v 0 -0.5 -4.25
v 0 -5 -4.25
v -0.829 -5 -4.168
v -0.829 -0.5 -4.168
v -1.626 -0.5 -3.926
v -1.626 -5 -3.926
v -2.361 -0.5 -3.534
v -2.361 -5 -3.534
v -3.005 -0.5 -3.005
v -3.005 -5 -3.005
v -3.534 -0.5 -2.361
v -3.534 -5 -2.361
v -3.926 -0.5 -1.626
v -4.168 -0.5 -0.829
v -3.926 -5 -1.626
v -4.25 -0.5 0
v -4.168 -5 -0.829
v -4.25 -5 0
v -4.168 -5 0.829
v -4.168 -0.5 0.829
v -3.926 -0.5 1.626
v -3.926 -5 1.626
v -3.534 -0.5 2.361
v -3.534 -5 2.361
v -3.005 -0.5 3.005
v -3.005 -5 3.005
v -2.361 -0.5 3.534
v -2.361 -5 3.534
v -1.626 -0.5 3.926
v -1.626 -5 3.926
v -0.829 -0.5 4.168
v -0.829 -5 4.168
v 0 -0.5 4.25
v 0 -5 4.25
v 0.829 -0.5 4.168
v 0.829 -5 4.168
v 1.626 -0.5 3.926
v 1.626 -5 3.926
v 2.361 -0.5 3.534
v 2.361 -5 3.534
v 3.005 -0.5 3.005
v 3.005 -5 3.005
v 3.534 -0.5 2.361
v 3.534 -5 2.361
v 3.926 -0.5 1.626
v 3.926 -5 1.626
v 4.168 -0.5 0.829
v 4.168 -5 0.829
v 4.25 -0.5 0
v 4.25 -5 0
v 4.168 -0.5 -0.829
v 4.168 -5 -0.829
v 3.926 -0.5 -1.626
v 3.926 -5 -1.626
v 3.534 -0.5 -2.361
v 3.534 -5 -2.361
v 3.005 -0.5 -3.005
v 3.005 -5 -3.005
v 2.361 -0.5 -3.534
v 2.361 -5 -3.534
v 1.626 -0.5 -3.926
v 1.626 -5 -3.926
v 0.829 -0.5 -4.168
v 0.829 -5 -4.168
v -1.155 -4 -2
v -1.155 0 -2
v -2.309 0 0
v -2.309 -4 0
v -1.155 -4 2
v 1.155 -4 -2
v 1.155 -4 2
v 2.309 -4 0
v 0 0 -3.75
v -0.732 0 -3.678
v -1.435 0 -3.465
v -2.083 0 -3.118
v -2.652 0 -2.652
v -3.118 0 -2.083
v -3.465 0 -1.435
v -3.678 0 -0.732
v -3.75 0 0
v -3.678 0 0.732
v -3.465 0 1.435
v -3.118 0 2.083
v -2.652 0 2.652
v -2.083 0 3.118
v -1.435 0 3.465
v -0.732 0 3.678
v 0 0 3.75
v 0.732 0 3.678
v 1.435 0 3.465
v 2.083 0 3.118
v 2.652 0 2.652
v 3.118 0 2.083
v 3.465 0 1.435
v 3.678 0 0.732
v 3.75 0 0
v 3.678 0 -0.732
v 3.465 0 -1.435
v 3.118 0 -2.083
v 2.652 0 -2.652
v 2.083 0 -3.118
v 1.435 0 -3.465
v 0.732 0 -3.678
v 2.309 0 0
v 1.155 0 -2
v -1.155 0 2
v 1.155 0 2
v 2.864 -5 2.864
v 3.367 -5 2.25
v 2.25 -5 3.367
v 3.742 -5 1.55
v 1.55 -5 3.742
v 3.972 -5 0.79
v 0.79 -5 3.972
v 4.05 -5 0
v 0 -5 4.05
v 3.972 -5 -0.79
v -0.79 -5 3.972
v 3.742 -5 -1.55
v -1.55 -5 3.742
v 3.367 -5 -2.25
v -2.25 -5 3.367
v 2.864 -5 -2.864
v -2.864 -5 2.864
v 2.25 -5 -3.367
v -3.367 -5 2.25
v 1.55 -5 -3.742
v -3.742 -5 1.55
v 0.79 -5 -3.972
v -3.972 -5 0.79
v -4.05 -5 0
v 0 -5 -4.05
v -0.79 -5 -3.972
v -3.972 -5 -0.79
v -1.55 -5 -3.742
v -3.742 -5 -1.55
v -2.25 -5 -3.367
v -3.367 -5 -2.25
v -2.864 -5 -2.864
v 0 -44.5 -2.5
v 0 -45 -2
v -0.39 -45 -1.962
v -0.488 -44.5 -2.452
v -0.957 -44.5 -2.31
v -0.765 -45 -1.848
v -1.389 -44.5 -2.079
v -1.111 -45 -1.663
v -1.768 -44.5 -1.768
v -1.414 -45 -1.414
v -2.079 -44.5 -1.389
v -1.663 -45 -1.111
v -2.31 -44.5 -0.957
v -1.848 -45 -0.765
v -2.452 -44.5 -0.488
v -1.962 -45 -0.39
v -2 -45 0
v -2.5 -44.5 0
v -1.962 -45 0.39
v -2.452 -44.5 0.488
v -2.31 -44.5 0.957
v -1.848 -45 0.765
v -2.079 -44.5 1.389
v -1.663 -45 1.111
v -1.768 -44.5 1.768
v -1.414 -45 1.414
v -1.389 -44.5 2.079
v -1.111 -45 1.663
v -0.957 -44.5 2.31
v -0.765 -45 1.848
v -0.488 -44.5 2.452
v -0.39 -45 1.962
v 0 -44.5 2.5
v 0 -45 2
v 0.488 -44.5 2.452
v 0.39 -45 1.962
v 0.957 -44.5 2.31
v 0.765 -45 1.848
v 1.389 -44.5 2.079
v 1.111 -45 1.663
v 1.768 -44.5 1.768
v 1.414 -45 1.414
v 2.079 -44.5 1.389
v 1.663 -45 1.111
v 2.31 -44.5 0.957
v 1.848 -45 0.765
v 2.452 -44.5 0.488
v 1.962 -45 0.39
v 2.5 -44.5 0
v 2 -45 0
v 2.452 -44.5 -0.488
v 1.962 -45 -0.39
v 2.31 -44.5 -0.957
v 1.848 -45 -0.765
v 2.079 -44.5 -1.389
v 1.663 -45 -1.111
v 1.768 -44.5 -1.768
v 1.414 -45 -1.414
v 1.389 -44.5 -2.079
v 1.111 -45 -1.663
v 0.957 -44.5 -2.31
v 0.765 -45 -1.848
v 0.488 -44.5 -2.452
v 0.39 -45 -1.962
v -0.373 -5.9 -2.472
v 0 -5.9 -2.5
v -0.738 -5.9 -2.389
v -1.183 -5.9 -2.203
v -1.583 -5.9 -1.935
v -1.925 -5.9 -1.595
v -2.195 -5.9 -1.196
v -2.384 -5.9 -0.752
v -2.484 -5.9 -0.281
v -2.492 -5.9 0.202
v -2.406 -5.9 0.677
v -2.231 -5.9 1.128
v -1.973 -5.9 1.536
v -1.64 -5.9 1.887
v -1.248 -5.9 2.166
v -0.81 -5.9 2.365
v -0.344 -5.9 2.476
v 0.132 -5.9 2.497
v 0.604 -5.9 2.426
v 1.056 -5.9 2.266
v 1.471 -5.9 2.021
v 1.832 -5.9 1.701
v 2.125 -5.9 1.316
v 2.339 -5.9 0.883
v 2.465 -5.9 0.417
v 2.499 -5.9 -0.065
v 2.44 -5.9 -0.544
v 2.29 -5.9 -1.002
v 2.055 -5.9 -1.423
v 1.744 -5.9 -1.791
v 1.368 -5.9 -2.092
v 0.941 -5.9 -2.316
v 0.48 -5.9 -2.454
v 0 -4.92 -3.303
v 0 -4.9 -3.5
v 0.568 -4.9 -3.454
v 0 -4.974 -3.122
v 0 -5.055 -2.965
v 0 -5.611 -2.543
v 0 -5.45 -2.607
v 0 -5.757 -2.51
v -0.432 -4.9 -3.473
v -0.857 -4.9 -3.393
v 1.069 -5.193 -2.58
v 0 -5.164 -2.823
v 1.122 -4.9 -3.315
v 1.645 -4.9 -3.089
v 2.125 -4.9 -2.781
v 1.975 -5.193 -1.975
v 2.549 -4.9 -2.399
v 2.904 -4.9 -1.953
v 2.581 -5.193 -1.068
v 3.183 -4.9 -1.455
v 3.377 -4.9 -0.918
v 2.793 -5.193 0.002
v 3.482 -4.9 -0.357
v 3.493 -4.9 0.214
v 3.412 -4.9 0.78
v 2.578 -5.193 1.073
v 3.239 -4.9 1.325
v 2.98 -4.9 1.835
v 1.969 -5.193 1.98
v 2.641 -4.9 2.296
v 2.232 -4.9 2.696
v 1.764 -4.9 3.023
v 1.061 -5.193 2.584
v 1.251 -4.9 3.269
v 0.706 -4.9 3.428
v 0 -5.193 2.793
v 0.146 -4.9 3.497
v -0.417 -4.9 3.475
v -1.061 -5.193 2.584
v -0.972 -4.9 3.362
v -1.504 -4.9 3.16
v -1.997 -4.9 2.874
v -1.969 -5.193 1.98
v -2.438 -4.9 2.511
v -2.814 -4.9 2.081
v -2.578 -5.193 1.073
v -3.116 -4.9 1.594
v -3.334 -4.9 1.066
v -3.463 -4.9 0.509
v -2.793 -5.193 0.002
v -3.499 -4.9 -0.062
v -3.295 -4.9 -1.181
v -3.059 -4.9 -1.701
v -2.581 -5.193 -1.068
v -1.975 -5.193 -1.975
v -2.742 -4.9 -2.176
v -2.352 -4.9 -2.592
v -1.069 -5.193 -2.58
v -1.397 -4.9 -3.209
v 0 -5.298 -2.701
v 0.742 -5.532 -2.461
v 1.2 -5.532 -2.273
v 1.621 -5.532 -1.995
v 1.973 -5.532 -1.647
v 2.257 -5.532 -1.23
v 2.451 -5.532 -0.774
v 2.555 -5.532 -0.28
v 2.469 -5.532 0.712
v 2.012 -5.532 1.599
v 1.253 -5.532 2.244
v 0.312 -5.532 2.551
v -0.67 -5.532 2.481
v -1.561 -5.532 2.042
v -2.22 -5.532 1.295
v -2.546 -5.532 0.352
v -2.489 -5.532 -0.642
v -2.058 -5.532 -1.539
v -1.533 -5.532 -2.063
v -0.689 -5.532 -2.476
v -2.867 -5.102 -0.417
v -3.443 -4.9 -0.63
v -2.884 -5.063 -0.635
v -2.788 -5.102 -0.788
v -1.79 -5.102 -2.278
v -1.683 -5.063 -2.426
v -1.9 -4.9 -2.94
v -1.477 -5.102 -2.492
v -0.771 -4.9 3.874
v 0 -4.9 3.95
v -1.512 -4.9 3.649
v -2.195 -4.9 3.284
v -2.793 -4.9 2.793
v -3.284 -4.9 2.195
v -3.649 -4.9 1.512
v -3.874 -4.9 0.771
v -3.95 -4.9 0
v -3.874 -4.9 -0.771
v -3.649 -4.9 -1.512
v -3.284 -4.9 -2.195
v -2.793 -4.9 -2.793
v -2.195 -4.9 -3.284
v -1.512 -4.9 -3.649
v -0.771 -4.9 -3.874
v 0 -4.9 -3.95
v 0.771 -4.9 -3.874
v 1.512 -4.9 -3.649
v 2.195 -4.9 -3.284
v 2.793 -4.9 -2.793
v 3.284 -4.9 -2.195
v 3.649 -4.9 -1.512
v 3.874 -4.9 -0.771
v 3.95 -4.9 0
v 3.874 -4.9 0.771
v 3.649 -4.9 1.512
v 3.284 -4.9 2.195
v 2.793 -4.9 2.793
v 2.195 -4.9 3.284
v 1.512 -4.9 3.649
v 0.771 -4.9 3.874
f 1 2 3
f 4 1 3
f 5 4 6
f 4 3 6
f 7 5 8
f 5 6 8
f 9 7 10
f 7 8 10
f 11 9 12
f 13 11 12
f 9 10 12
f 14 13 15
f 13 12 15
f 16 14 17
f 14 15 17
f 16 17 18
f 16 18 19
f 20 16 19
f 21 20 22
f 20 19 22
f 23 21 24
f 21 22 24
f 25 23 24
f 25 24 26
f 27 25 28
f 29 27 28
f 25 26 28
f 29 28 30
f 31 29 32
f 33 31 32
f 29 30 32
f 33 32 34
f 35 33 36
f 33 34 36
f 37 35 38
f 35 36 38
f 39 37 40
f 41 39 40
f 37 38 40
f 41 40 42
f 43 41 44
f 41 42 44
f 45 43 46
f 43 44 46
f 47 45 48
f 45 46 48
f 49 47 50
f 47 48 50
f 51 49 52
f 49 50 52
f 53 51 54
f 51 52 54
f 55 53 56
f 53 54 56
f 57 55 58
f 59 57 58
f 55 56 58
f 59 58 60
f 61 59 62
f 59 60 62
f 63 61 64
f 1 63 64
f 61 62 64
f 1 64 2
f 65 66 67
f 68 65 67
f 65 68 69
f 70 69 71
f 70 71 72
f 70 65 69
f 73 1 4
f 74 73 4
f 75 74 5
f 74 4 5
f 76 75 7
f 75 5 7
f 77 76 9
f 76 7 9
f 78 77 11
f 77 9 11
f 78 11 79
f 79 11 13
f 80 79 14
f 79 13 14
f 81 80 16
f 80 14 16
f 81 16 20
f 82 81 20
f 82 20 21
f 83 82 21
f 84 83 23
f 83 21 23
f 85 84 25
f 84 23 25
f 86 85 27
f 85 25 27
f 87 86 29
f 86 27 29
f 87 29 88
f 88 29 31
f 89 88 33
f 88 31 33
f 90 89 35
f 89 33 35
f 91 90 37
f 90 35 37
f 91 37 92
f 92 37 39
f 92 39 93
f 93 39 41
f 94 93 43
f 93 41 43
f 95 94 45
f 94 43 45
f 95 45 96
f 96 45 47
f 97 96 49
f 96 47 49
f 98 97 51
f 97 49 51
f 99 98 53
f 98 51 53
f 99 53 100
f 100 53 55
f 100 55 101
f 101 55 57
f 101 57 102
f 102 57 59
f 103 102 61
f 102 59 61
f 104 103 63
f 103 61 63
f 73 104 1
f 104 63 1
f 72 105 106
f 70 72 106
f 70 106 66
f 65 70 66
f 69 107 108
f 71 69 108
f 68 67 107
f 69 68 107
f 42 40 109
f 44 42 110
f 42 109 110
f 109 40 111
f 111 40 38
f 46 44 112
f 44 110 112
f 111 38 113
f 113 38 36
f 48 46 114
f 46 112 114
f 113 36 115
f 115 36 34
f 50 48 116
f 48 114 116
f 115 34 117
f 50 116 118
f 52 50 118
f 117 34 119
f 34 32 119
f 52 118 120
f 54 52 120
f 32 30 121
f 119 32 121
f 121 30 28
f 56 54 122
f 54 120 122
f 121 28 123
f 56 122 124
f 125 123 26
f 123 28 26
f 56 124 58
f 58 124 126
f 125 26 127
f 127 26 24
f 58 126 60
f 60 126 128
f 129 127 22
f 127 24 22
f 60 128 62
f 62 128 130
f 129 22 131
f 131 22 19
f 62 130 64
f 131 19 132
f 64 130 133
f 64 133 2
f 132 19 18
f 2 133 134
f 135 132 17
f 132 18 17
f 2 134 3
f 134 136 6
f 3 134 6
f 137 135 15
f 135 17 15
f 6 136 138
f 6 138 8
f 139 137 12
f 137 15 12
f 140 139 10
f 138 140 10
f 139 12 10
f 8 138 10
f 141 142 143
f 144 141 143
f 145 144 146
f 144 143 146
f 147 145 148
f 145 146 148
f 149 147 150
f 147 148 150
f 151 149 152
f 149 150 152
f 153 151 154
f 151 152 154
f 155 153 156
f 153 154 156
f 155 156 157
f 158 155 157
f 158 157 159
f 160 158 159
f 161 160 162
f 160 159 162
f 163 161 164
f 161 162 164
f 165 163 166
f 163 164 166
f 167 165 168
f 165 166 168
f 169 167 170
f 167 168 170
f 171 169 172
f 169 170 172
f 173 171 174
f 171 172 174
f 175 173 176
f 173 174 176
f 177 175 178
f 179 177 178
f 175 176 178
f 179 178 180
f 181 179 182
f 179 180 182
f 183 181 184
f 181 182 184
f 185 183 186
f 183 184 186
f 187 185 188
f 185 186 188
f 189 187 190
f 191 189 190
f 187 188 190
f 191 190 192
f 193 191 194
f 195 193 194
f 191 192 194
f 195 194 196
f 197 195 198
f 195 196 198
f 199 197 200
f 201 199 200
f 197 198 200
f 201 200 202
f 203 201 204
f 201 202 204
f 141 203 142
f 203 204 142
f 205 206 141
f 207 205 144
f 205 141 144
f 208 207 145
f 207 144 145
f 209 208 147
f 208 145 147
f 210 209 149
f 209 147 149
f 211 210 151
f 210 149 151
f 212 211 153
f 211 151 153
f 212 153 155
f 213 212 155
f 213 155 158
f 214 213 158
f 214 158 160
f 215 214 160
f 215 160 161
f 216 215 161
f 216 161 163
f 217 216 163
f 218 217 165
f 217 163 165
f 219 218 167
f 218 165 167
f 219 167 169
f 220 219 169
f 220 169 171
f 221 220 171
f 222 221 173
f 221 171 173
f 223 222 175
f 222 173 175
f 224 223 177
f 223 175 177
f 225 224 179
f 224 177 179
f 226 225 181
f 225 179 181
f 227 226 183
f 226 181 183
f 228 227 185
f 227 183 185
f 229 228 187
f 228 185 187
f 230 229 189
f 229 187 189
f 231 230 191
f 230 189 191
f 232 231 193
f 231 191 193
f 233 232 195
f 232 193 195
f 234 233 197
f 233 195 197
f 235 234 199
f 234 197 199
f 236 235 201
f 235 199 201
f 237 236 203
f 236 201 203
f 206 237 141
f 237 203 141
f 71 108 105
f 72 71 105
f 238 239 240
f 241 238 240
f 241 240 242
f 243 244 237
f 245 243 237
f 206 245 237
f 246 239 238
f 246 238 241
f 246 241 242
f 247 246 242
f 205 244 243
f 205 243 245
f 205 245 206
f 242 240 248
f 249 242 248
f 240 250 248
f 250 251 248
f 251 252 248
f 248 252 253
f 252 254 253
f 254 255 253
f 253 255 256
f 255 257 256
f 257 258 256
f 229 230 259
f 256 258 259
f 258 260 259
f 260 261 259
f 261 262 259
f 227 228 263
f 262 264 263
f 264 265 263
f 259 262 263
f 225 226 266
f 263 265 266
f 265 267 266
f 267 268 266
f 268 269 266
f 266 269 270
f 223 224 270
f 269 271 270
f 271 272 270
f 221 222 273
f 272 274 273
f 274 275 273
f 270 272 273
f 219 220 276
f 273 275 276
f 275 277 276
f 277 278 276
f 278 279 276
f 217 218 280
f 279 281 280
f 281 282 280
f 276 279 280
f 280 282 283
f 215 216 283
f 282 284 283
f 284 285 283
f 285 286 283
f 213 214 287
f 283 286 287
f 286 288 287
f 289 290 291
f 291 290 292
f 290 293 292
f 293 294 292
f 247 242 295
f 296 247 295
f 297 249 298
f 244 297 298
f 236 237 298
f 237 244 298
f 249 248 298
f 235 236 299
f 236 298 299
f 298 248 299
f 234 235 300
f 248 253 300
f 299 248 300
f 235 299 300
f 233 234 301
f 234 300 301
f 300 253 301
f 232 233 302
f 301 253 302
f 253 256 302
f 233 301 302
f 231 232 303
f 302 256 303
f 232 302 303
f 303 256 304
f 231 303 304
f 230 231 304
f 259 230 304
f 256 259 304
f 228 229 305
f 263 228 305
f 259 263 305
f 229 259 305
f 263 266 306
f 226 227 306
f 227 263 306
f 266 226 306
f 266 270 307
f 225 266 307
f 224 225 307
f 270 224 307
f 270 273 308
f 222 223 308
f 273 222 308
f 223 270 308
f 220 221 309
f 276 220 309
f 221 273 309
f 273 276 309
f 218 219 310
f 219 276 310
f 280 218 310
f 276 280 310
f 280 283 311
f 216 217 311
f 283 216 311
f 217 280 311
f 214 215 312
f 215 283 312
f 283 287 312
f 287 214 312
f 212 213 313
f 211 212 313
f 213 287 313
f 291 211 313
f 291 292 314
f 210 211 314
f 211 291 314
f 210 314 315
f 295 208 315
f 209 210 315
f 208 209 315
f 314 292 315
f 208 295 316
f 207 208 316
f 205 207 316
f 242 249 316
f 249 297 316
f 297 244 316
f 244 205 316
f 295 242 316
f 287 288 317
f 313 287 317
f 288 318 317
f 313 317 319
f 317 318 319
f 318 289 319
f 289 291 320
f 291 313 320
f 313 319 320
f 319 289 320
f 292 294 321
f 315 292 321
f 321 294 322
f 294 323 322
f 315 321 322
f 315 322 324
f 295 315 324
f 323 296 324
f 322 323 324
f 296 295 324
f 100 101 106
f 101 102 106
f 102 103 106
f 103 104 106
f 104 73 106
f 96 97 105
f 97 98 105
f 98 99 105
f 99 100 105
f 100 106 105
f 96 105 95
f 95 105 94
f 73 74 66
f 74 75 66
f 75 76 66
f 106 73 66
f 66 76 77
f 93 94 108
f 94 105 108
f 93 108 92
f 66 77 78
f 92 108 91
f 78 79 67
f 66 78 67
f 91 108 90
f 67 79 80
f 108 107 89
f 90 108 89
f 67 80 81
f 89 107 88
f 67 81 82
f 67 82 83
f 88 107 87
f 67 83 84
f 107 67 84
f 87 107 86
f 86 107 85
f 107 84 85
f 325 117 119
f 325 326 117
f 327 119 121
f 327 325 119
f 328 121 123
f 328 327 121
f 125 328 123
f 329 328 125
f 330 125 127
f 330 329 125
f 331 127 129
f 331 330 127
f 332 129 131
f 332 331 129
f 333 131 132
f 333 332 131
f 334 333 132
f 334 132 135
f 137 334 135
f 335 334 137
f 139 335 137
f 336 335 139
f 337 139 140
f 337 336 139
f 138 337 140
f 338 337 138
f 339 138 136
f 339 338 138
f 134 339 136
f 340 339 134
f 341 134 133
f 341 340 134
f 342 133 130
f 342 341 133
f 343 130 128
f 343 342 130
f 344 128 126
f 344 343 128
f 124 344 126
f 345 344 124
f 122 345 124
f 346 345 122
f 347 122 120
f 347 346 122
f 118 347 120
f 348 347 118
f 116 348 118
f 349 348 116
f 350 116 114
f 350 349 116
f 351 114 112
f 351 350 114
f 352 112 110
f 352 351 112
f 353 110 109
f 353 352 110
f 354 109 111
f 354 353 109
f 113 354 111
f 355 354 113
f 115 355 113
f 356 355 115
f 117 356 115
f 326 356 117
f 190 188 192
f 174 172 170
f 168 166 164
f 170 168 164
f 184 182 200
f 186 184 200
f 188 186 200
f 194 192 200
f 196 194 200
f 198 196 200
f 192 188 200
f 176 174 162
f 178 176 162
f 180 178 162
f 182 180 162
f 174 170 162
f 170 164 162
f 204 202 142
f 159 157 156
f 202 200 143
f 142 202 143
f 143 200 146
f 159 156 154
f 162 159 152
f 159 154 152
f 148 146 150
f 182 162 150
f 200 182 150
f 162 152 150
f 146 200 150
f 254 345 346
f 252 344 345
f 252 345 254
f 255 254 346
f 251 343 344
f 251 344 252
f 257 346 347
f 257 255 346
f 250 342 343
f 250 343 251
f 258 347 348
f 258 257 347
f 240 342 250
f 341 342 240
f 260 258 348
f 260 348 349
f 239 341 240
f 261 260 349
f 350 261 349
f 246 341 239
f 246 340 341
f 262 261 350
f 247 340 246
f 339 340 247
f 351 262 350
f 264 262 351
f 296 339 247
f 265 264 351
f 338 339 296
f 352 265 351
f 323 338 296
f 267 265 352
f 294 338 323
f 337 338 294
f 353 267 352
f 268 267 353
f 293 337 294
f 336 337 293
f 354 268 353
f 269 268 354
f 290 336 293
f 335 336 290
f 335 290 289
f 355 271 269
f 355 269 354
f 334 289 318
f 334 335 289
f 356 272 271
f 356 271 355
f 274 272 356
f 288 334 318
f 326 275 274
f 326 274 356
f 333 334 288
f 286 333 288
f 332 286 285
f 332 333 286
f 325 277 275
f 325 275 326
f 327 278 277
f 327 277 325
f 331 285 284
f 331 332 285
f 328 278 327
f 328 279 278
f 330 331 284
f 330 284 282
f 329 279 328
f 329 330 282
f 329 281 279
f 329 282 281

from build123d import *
from build123d.topology import SkipClean

# Parameters (mm, degrees)
CHAMFER1_SIZE      = 0.5
FILLET2_R          = 1
CUT_EXTRUDE1_DEPTH = 4


with BuildPart() as part:
    # Sketch1 → Revolve1 (revolve)
    with BuildSketch(Plane.XY, mode=Mode.PRIVATE) as revolve1_sk:
        Polygon((0, 0), (4.25, 0), (4.25, -5), (2.5, -5), (2.5, -45), (0, -45), align=None)
    revolve(revolve1_sk.sketch.rotate(Axis((0, -45, 0), (0, 1, 0)), 90), axis=Axis((0, -45, 0), (0, 1, 0)))

    # Chamfer1
    chamfer1_edges = [part.edges().sort_by_distance(p)[0] for p in [
        (0, -45, 2.5),
        (0, 0, 4.25),
    ]]
    chamfer(chamfer1_edges, length=CHAMFER1_SIZE)

    # Sketch2 → Cut-Revolve1 (revolve, cut)
    with SkipClean():  # the faces are left unmerged after this step: merging them gives an invalid solid
        with BuildSketch(Plane.XY, mode=Mode.PRIVATE) as cut_revolve1_sk:
            Polygon((3.95, -4.9), (2.5, -4.9), (2.5, -5.679573885), (4.05, -5.679573885), (4.05, -5), align=None)
        revolve(cut_revolve1_sk.sketch.rotate(Axis((0, 0, 0), (0, -1, 0)), 90), axis=Axis((0, 0, 0), (0, -1, 0)), mode=Mode.SUBTRACT)

    # Fillet2
    fillet2_edges = [part.edges().sort_by_distance(p)[0] for p in [
        (0, -4.9, -2.5),
    ]]
    fillet(fillet2_edges, radius=FILLET2_R)

    # Sketch3 → Cut-Extrude1 (cut)
    with BuildSketch(Plane(origin=(0, 0, 0), x_dir=(1, 0, 0), z_dir=(0, 1, 0))):
        Polygon((-1.154700538, 2), (-2.309401077, 0), (-1.154700538, -2), (1.154700538, -2), (2.309401077, 0), (1.154700538, 2), align=None)
    extrude(amount=-CUT_EXTRUDE1_DEPTH, mode=Mode.SUBTRACT)


solid = part.part
